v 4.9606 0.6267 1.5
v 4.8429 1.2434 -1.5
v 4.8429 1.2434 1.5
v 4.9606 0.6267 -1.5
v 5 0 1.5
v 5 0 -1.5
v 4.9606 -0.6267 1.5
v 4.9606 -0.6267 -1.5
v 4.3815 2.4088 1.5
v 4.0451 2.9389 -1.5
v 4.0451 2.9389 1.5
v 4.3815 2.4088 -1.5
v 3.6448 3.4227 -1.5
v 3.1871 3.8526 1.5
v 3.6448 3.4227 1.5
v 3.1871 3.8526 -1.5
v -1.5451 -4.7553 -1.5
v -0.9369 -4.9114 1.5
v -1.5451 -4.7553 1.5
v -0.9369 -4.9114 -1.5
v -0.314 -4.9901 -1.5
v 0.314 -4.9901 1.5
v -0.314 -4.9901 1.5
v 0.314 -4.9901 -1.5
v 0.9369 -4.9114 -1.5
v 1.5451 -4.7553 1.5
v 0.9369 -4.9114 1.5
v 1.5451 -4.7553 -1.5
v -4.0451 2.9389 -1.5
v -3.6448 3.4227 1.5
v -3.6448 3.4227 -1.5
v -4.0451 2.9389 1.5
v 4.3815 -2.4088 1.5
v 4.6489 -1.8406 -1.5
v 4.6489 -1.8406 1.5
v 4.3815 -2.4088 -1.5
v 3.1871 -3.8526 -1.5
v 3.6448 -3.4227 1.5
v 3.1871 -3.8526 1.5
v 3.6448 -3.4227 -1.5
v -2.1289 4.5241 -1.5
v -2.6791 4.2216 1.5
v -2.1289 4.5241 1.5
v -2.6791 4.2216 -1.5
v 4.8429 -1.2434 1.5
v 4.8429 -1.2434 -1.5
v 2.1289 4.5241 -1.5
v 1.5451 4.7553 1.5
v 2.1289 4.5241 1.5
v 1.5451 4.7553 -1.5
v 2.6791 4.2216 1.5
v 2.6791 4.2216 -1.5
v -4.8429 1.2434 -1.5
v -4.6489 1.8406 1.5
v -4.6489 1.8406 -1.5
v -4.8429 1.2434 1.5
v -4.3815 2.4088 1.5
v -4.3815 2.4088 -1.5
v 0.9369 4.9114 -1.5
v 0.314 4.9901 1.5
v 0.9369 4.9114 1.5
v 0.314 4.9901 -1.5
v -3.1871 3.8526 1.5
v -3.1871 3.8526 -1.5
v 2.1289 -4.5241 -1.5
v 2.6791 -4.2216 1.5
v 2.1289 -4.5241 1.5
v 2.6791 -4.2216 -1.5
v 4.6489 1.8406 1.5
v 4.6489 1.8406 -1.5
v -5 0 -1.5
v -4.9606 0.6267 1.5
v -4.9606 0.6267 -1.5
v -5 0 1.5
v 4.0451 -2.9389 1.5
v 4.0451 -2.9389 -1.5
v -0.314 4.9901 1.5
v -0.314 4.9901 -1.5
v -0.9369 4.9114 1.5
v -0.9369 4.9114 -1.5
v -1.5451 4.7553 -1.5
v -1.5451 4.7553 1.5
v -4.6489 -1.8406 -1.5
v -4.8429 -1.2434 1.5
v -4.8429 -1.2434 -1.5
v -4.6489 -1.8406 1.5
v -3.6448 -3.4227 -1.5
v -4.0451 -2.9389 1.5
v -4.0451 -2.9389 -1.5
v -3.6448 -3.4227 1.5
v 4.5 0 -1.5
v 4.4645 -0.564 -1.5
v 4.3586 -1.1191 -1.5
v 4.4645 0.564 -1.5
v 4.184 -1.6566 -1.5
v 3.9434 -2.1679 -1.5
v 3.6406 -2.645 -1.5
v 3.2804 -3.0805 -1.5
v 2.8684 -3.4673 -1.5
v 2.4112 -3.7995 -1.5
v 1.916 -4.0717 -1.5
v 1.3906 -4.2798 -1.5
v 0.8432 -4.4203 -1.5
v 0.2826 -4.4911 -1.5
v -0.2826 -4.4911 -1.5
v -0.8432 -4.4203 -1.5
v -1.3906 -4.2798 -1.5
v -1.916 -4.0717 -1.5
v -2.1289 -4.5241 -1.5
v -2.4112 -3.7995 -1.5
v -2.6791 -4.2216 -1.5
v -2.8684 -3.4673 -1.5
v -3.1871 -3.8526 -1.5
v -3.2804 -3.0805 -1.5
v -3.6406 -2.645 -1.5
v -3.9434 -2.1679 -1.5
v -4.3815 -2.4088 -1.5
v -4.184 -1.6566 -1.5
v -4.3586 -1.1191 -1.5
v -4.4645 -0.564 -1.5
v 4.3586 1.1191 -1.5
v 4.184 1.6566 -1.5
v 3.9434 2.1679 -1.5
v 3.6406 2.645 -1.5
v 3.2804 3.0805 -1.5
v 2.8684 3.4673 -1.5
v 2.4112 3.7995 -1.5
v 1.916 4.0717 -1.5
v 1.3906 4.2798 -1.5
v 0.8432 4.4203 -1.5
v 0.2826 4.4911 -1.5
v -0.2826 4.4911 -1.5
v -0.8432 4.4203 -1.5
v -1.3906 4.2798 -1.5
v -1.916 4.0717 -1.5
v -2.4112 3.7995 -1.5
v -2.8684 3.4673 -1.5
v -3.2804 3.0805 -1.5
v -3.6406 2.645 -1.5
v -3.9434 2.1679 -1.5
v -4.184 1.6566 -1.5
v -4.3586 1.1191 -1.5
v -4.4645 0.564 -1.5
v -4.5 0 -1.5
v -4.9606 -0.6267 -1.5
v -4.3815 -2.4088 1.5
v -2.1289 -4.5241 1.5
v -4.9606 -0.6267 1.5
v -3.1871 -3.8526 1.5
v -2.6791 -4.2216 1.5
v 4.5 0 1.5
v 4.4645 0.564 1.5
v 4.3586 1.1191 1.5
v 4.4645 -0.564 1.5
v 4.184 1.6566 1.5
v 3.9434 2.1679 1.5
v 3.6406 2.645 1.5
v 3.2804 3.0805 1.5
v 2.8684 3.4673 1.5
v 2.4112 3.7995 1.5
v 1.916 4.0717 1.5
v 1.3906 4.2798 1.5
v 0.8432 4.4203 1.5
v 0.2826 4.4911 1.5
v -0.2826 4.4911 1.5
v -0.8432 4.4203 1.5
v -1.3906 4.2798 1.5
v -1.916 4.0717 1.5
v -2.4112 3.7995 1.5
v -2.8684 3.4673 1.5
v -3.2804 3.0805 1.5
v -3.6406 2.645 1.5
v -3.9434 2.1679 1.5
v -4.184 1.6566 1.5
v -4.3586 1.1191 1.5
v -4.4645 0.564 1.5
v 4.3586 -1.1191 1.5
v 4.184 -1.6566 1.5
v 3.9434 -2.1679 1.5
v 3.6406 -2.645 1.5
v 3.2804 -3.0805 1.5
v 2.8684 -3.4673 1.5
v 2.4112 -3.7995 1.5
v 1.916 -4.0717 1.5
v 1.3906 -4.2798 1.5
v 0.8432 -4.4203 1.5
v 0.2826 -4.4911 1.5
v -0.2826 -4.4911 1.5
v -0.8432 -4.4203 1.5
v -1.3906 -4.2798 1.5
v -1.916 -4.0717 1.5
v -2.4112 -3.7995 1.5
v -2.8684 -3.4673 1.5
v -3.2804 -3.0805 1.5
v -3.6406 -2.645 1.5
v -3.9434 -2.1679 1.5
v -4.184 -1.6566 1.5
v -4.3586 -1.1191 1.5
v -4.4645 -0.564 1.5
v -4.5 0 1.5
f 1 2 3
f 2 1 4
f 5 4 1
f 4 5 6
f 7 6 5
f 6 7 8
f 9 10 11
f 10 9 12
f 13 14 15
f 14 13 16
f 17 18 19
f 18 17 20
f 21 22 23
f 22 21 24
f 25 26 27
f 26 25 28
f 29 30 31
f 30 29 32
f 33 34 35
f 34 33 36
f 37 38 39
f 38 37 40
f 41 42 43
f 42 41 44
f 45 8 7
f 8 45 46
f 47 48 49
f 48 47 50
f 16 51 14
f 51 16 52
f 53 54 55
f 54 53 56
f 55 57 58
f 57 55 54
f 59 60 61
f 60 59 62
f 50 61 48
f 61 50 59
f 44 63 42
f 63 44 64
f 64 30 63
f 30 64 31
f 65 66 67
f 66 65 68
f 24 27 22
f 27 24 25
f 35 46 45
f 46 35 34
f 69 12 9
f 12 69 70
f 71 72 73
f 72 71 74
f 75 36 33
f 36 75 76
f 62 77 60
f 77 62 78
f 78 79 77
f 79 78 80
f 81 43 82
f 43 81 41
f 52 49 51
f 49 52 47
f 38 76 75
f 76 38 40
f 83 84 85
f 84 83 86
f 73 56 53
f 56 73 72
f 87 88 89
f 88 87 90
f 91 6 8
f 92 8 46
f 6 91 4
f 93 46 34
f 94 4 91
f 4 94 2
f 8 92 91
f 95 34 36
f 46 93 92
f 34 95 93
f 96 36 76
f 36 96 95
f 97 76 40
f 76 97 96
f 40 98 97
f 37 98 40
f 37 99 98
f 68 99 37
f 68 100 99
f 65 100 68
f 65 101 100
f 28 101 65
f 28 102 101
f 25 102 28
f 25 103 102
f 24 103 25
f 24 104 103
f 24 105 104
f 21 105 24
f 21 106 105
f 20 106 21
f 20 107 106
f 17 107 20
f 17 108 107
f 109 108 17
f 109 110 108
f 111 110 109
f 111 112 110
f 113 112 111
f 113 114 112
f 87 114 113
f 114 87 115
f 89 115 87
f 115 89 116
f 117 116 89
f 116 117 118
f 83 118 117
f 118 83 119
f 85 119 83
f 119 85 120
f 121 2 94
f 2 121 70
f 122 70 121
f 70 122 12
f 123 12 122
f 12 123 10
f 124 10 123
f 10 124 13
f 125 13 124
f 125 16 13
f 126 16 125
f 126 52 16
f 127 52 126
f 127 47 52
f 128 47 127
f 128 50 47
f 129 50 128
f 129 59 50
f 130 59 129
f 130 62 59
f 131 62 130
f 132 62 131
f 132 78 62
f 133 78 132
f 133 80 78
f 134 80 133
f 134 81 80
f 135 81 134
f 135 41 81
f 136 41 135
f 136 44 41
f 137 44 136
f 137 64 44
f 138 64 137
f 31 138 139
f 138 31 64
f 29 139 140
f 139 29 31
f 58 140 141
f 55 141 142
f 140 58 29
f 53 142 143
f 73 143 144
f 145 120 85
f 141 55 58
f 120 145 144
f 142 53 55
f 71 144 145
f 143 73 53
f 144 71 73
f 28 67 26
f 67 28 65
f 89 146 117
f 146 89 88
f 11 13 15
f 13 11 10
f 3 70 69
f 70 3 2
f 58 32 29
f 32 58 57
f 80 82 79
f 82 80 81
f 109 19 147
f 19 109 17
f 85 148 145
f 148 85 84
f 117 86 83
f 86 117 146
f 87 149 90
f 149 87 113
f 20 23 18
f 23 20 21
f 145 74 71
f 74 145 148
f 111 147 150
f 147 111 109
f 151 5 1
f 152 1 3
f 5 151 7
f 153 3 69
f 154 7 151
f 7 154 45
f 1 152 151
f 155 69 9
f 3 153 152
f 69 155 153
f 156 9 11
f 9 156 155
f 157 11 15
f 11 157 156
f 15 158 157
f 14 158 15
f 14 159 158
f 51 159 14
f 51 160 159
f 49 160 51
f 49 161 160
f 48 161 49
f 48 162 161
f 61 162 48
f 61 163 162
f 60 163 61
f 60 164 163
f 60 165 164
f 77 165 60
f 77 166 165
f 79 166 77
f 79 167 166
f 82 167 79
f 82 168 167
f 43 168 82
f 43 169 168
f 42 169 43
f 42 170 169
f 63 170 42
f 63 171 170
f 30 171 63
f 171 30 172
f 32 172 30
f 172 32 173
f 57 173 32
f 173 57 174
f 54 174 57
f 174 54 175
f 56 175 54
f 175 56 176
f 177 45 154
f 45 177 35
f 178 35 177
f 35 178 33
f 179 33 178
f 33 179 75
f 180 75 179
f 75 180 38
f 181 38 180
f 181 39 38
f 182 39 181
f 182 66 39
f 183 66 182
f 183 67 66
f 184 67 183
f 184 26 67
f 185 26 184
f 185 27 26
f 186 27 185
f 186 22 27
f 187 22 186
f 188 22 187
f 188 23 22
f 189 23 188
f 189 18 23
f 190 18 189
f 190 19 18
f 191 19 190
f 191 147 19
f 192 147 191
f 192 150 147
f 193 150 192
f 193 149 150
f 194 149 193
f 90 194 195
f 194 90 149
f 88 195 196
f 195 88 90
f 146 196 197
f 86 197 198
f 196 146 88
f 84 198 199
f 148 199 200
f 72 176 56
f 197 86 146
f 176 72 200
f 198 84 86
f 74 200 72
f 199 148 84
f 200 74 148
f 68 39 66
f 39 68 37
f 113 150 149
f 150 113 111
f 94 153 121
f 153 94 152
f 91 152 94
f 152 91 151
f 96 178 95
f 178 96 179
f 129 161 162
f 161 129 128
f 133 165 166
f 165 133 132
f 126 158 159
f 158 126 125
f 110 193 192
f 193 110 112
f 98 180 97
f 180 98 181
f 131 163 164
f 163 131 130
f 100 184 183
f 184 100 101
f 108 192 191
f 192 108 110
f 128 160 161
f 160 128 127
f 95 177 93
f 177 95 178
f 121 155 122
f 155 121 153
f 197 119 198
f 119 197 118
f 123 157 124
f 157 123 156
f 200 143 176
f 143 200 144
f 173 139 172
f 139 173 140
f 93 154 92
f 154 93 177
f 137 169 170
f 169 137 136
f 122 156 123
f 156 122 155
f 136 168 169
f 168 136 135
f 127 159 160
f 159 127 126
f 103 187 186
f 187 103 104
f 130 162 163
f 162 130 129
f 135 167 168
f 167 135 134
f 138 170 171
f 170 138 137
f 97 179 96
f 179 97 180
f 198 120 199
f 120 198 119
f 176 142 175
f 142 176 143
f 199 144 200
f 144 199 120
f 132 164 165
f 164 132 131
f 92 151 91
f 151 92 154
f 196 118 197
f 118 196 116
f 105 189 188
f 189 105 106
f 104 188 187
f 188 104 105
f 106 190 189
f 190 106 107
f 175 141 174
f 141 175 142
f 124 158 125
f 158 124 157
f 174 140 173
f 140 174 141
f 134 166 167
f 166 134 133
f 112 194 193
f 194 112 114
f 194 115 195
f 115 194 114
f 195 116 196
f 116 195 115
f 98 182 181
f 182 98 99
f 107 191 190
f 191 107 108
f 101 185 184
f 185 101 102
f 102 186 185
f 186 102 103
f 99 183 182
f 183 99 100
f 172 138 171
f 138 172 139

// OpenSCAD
$fn = 50;


difference() {
	union() {
		translate(v = [0, 0, -1.5000000000]) {
			cylinder(h = 3, r = 5.0000000000);
		}
	}
	union() {
		translate(v = [0, 0, -100.0000000000]) {
			cylinder(h = 200, r = 4.5000000000);
		}
	}
}
